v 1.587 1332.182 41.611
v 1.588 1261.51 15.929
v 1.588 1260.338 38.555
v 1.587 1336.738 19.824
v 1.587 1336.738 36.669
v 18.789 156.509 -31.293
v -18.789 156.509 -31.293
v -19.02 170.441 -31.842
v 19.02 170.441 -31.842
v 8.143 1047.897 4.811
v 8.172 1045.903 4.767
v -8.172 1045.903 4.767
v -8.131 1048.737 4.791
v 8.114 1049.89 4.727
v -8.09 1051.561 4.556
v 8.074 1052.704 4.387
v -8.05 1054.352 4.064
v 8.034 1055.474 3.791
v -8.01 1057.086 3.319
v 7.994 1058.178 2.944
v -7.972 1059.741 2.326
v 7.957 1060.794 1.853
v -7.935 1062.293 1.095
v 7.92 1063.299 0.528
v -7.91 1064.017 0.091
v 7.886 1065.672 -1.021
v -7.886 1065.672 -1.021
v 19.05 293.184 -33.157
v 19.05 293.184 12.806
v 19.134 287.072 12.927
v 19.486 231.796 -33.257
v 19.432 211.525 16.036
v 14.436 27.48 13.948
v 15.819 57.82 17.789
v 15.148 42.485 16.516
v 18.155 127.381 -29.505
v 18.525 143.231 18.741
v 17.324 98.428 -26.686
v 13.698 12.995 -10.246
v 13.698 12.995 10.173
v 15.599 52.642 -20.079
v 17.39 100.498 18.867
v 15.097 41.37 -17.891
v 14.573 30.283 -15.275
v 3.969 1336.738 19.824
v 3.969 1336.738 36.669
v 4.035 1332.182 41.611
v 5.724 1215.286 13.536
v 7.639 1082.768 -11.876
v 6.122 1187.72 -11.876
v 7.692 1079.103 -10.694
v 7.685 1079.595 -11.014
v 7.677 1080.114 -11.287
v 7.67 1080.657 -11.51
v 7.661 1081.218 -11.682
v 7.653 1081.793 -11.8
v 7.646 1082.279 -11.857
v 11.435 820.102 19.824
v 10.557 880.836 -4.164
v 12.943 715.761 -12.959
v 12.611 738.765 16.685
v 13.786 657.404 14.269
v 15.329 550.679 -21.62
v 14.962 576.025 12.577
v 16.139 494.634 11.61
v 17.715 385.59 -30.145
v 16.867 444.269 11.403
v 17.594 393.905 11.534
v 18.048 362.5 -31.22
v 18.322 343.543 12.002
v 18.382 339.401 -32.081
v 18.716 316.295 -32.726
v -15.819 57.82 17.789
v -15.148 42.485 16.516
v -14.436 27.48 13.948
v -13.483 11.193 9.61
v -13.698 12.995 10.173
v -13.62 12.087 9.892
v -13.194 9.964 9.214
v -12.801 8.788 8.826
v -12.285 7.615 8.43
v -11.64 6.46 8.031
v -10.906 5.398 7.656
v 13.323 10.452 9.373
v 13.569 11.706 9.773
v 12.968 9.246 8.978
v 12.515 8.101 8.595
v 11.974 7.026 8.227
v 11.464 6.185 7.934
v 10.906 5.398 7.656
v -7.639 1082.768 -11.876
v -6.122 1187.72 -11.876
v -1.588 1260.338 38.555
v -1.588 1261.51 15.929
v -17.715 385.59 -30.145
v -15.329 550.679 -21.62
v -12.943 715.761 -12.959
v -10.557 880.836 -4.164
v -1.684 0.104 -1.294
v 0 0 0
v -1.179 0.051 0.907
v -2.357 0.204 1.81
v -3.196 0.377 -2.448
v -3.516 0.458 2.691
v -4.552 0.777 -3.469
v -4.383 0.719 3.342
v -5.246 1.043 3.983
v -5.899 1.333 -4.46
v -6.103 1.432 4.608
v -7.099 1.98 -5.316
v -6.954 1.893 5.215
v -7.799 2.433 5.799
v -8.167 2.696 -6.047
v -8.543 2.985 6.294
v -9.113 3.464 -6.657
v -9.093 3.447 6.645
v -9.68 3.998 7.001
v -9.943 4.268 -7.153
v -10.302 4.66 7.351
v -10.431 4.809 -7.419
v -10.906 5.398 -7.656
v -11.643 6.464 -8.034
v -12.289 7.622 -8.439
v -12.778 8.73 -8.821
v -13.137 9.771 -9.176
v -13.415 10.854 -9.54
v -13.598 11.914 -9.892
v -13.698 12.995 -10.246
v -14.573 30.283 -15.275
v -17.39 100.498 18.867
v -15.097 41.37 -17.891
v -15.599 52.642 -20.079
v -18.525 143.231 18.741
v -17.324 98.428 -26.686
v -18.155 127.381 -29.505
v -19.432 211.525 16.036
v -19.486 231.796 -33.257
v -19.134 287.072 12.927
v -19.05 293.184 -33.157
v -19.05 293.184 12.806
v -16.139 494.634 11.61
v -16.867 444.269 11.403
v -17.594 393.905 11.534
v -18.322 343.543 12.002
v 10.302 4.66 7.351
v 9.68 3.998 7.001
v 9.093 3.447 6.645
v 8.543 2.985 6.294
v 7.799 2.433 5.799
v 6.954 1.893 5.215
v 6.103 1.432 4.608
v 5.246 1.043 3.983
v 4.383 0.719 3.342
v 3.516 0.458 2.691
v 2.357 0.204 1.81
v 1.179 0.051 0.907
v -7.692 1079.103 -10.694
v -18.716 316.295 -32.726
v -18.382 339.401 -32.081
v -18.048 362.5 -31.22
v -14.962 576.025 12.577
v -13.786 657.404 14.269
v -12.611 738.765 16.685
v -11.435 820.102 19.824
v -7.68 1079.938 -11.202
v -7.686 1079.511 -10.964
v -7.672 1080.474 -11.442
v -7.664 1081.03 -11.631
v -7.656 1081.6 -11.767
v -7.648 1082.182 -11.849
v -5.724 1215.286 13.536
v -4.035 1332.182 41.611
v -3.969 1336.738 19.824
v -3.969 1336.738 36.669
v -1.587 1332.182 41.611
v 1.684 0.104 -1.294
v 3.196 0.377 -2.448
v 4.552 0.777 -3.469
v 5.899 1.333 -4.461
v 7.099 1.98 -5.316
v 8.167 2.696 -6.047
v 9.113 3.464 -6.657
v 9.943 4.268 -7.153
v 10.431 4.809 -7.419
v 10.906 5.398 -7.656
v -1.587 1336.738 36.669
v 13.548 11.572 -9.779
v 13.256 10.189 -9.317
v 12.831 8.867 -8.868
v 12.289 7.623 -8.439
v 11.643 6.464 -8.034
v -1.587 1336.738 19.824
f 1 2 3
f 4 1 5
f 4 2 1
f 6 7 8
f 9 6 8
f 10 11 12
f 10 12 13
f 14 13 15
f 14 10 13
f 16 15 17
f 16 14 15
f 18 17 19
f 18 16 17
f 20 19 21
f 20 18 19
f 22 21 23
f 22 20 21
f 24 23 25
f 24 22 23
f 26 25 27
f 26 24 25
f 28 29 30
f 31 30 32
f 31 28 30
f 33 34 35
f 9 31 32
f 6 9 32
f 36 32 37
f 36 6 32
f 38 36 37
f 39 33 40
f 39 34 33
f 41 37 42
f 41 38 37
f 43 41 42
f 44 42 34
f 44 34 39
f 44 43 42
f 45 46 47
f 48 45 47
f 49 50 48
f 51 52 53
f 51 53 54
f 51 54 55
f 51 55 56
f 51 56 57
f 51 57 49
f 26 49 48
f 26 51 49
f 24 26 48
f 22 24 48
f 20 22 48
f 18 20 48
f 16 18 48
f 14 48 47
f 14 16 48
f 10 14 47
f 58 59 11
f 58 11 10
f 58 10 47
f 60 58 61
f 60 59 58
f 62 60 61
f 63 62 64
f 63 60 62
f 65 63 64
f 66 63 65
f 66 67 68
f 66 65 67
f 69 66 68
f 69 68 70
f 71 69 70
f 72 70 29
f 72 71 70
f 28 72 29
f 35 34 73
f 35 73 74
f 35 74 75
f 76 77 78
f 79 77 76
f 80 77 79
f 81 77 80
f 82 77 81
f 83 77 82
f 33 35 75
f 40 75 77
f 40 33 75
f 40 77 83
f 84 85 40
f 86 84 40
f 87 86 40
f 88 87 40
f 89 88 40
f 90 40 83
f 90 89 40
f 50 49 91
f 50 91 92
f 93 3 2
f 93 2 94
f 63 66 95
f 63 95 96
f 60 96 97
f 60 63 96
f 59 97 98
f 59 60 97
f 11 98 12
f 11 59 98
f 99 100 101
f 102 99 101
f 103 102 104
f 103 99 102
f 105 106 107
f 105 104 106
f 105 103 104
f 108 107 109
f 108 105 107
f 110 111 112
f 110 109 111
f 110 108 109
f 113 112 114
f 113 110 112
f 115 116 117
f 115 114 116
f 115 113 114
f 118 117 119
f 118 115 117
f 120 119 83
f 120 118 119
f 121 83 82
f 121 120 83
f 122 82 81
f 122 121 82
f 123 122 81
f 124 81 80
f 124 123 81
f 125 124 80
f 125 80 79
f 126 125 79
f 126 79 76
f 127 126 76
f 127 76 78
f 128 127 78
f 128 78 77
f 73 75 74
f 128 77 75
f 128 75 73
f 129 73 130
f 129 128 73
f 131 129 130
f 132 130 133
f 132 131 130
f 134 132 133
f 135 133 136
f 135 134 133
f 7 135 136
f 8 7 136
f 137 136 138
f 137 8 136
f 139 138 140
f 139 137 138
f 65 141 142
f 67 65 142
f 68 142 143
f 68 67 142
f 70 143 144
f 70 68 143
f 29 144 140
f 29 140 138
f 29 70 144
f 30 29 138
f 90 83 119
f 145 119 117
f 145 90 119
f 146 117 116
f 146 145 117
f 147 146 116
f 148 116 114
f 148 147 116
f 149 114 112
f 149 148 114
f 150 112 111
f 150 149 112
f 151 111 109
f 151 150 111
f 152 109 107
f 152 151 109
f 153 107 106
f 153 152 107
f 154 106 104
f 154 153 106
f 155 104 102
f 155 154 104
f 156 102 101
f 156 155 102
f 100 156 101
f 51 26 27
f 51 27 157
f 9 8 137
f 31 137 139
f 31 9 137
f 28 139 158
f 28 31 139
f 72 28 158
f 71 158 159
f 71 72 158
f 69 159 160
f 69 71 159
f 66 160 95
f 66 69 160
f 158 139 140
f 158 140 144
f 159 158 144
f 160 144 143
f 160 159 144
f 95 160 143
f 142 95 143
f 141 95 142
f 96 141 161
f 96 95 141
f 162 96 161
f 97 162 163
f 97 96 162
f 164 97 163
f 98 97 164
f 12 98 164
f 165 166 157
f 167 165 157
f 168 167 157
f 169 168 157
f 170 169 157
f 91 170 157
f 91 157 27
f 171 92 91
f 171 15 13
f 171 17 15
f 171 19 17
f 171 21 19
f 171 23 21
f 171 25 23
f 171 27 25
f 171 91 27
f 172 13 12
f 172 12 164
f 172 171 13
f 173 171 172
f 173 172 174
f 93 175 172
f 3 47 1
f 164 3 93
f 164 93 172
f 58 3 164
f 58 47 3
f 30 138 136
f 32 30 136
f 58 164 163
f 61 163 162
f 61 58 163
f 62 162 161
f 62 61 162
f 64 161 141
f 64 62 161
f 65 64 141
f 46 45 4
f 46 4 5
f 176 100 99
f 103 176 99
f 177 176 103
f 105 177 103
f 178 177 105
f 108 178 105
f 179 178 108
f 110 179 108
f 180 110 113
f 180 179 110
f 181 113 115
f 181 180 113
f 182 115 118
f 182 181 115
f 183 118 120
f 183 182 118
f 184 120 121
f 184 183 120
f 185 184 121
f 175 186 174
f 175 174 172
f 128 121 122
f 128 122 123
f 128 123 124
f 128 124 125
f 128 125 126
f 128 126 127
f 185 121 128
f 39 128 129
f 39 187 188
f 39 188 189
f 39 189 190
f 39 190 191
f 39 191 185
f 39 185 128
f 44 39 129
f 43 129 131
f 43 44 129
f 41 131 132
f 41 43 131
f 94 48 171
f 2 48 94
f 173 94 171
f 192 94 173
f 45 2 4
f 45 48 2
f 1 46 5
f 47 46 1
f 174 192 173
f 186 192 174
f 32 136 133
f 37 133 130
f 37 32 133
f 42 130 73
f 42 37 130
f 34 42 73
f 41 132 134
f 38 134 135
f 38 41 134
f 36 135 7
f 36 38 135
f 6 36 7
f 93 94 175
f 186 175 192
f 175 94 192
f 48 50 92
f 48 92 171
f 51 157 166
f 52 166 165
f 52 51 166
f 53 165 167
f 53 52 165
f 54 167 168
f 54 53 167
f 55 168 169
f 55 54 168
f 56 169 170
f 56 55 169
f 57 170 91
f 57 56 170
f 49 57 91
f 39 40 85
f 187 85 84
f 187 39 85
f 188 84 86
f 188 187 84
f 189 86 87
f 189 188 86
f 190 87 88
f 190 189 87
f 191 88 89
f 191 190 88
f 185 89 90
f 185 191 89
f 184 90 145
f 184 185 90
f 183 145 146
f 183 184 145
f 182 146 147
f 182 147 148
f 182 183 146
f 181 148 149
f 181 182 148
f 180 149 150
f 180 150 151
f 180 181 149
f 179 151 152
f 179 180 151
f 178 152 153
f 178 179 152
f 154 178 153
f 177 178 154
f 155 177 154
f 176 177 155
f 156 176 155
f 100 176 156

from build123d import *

# Parameters (mm, degrees)
BOSS_EXTRUDE1_DEPTH      = 31.75
BOSS_EXTRUDE1_DEPTH_BACK = 31.75
CUT_EXTRUDE2_DEPTH       = 1340.217520299
SKETCH3_W                = 3.175
SKETCH3_H                = 76.2
CUT_EXTRUDE3_DEPTH       = 1338.420695435


with BuildPart() as part:
    # Sketch1 → Boss-Extrude1 (new, two sides: drawn at the far end of the back side and taken through both)
    with BuildSketch(Plane(origin=(0, 0, 0), x_dir=(0, 0, -1), z_dir=(1, 0, 0)).offset(-BOSS_EXTRUDE1_DEPTH_BACK)):
        with BuildLine():
            Line((1.021340573, 1065.671760022), (10.69404187, 1079.103015809))
            ThreePointArc((10.69404187, 1079.103015809), (11.573445276, 1080.842426323), (11.876332412, 1082.767824636))
            Line((11.876332412, 1082.767824636), (11.876332412, 1187.719530026))
            Line((11.876332412, 1187.719530026), (-13.536061703, 1215.286446683))
            Line((-13.536061703, 1215.286446683), (-19.823769094, 1336.738131825))
            Line((-19.823769094, 1336.738131825), (-36.668668575, 1336.738131825))
            Line((-36.668668575, 1336.738131825), (-41.611308298, 1332.181789519))
            Line((-41.611308298, 1332.181789519), (-19.823769313, 820.101609747))
            ThreePointArc((-19.823769313, 820.101609747), (-14.269049163, 657.404177816), (-11.609546724, 494.633675821))
            ThreePointArc((-11.609546724, 494.633675821), (-11.552697494, 390.848511752), (-12.926889154, 287.072430162))
            ThreePointArc((-12.926889154, 287.072430162), (-14.08497073, 249.282151425), (-16.036320575, 211.524522345))
            ThreePointArc((-16.036320575, 211.524522345), (-18.862629391, 134.694563635), (-17.789412377, 57.820128469))
            ThreePointArc((-17.789412377, 57.820128469), (-14.713555739, 31.224003963), (-7.655684583, 5.397637832))
            ThreePointArc((-7.655684583, 5.397637832), (0, 0), (7.655684583, 5.397637832))
            ThreePointArc((7.655684583, 5.397637832), (14.877278089, 28.754462777), (20.079353087, 52.642348827))
            ThreePointArc((20.079353087, 52.642348827), (27.352586181, 104.395526294), (31.292623673, 156.508551558))
            ThreePointArc((31.292623673, 156.508551558), (31.58109291, 163.474292498), (31.841795924, 170.441127883))
            ThreePointArc((31.841795924, 170.441127883), (33.322524829, 278.033900996), (30.144822487, 385.589931009))
            ThreePointArc((30.144822487, 385.589931009), (12.959303763, 715.76096893), (-4.76677265, 1045.903426895))
            ThreePointArc((-4.76677265, 1045.903426895), (-3.565814336, 1056.283327954), (1.021340573, 1065.671760022))
        make_face()
    extrude(amount=BOSS_EXTRUDE1_DEPTH + BOSS_EXTRUDE1_DEPTH_BACK)

    # Sketch2 → Cut-Extrude2 (cut, through all)
    with BuildSketch(Plane.XY.offset(-33.399831543)):
        with BuildLine():
            Line((-31.75, 0), (0, 0))
            ThreePointArc((0, 0), (-9.440831446, 3.765721828), (-13.698146022, 12.995306427))
            ThreePointArc((-13.698146022, 12.995306427), (-18.724333894, 153.044911462), (-19.05, 293.18430056))
            Line((-19.05, 293.18430056), (-3.96875, 1336.738131825))
            Line((-3.96875, 1336.738131825), (-31.75, 1336.738131825))
            Line((-31.75, 1336.738131825), (-31.75, 0))
        make_face()
        with BuildLine():
            Line((3.96875, 1336.738131825), (19.05, 293.18430056))
            ThreePointArc((19.05, 293.18430056), (18.724333894, 153.044911462), (13.698146022, 12.995306427))
            ThreePointArc((13.698146022, 12.995306427), (9.440831446, 3.765721828), (0, 0))
            Line((0, 0), (31.75, 0))
            Line((31.75, 0), (31.75, 1336.738131825))
            Line((31.75, 1336.738131825), (3.96875, 1336.738131825))
        make_face()
    extrude(amount=CUT_EXTRUDE2_DEPTH, mode=Mode.SUBTRACT)

    # Sketch3 → Cut-Extrude3 (cut, through all)
    with BuildSketch(Plane(origin=(0, 2.549675539, -49.248855197), x_dir=(-1, 0, 0), z_dir=(0, 0.051702023951454394, -0.9986625559814103))):
        with Locations((0, 1298.746163787)):
            Rectangle(SKETCH3_W, SKETCH3_H)
    extrude(amount=-CUT_EXTRUDE3_DEPTH, mode=Mode.SUBTRACT)


solid = part.part
